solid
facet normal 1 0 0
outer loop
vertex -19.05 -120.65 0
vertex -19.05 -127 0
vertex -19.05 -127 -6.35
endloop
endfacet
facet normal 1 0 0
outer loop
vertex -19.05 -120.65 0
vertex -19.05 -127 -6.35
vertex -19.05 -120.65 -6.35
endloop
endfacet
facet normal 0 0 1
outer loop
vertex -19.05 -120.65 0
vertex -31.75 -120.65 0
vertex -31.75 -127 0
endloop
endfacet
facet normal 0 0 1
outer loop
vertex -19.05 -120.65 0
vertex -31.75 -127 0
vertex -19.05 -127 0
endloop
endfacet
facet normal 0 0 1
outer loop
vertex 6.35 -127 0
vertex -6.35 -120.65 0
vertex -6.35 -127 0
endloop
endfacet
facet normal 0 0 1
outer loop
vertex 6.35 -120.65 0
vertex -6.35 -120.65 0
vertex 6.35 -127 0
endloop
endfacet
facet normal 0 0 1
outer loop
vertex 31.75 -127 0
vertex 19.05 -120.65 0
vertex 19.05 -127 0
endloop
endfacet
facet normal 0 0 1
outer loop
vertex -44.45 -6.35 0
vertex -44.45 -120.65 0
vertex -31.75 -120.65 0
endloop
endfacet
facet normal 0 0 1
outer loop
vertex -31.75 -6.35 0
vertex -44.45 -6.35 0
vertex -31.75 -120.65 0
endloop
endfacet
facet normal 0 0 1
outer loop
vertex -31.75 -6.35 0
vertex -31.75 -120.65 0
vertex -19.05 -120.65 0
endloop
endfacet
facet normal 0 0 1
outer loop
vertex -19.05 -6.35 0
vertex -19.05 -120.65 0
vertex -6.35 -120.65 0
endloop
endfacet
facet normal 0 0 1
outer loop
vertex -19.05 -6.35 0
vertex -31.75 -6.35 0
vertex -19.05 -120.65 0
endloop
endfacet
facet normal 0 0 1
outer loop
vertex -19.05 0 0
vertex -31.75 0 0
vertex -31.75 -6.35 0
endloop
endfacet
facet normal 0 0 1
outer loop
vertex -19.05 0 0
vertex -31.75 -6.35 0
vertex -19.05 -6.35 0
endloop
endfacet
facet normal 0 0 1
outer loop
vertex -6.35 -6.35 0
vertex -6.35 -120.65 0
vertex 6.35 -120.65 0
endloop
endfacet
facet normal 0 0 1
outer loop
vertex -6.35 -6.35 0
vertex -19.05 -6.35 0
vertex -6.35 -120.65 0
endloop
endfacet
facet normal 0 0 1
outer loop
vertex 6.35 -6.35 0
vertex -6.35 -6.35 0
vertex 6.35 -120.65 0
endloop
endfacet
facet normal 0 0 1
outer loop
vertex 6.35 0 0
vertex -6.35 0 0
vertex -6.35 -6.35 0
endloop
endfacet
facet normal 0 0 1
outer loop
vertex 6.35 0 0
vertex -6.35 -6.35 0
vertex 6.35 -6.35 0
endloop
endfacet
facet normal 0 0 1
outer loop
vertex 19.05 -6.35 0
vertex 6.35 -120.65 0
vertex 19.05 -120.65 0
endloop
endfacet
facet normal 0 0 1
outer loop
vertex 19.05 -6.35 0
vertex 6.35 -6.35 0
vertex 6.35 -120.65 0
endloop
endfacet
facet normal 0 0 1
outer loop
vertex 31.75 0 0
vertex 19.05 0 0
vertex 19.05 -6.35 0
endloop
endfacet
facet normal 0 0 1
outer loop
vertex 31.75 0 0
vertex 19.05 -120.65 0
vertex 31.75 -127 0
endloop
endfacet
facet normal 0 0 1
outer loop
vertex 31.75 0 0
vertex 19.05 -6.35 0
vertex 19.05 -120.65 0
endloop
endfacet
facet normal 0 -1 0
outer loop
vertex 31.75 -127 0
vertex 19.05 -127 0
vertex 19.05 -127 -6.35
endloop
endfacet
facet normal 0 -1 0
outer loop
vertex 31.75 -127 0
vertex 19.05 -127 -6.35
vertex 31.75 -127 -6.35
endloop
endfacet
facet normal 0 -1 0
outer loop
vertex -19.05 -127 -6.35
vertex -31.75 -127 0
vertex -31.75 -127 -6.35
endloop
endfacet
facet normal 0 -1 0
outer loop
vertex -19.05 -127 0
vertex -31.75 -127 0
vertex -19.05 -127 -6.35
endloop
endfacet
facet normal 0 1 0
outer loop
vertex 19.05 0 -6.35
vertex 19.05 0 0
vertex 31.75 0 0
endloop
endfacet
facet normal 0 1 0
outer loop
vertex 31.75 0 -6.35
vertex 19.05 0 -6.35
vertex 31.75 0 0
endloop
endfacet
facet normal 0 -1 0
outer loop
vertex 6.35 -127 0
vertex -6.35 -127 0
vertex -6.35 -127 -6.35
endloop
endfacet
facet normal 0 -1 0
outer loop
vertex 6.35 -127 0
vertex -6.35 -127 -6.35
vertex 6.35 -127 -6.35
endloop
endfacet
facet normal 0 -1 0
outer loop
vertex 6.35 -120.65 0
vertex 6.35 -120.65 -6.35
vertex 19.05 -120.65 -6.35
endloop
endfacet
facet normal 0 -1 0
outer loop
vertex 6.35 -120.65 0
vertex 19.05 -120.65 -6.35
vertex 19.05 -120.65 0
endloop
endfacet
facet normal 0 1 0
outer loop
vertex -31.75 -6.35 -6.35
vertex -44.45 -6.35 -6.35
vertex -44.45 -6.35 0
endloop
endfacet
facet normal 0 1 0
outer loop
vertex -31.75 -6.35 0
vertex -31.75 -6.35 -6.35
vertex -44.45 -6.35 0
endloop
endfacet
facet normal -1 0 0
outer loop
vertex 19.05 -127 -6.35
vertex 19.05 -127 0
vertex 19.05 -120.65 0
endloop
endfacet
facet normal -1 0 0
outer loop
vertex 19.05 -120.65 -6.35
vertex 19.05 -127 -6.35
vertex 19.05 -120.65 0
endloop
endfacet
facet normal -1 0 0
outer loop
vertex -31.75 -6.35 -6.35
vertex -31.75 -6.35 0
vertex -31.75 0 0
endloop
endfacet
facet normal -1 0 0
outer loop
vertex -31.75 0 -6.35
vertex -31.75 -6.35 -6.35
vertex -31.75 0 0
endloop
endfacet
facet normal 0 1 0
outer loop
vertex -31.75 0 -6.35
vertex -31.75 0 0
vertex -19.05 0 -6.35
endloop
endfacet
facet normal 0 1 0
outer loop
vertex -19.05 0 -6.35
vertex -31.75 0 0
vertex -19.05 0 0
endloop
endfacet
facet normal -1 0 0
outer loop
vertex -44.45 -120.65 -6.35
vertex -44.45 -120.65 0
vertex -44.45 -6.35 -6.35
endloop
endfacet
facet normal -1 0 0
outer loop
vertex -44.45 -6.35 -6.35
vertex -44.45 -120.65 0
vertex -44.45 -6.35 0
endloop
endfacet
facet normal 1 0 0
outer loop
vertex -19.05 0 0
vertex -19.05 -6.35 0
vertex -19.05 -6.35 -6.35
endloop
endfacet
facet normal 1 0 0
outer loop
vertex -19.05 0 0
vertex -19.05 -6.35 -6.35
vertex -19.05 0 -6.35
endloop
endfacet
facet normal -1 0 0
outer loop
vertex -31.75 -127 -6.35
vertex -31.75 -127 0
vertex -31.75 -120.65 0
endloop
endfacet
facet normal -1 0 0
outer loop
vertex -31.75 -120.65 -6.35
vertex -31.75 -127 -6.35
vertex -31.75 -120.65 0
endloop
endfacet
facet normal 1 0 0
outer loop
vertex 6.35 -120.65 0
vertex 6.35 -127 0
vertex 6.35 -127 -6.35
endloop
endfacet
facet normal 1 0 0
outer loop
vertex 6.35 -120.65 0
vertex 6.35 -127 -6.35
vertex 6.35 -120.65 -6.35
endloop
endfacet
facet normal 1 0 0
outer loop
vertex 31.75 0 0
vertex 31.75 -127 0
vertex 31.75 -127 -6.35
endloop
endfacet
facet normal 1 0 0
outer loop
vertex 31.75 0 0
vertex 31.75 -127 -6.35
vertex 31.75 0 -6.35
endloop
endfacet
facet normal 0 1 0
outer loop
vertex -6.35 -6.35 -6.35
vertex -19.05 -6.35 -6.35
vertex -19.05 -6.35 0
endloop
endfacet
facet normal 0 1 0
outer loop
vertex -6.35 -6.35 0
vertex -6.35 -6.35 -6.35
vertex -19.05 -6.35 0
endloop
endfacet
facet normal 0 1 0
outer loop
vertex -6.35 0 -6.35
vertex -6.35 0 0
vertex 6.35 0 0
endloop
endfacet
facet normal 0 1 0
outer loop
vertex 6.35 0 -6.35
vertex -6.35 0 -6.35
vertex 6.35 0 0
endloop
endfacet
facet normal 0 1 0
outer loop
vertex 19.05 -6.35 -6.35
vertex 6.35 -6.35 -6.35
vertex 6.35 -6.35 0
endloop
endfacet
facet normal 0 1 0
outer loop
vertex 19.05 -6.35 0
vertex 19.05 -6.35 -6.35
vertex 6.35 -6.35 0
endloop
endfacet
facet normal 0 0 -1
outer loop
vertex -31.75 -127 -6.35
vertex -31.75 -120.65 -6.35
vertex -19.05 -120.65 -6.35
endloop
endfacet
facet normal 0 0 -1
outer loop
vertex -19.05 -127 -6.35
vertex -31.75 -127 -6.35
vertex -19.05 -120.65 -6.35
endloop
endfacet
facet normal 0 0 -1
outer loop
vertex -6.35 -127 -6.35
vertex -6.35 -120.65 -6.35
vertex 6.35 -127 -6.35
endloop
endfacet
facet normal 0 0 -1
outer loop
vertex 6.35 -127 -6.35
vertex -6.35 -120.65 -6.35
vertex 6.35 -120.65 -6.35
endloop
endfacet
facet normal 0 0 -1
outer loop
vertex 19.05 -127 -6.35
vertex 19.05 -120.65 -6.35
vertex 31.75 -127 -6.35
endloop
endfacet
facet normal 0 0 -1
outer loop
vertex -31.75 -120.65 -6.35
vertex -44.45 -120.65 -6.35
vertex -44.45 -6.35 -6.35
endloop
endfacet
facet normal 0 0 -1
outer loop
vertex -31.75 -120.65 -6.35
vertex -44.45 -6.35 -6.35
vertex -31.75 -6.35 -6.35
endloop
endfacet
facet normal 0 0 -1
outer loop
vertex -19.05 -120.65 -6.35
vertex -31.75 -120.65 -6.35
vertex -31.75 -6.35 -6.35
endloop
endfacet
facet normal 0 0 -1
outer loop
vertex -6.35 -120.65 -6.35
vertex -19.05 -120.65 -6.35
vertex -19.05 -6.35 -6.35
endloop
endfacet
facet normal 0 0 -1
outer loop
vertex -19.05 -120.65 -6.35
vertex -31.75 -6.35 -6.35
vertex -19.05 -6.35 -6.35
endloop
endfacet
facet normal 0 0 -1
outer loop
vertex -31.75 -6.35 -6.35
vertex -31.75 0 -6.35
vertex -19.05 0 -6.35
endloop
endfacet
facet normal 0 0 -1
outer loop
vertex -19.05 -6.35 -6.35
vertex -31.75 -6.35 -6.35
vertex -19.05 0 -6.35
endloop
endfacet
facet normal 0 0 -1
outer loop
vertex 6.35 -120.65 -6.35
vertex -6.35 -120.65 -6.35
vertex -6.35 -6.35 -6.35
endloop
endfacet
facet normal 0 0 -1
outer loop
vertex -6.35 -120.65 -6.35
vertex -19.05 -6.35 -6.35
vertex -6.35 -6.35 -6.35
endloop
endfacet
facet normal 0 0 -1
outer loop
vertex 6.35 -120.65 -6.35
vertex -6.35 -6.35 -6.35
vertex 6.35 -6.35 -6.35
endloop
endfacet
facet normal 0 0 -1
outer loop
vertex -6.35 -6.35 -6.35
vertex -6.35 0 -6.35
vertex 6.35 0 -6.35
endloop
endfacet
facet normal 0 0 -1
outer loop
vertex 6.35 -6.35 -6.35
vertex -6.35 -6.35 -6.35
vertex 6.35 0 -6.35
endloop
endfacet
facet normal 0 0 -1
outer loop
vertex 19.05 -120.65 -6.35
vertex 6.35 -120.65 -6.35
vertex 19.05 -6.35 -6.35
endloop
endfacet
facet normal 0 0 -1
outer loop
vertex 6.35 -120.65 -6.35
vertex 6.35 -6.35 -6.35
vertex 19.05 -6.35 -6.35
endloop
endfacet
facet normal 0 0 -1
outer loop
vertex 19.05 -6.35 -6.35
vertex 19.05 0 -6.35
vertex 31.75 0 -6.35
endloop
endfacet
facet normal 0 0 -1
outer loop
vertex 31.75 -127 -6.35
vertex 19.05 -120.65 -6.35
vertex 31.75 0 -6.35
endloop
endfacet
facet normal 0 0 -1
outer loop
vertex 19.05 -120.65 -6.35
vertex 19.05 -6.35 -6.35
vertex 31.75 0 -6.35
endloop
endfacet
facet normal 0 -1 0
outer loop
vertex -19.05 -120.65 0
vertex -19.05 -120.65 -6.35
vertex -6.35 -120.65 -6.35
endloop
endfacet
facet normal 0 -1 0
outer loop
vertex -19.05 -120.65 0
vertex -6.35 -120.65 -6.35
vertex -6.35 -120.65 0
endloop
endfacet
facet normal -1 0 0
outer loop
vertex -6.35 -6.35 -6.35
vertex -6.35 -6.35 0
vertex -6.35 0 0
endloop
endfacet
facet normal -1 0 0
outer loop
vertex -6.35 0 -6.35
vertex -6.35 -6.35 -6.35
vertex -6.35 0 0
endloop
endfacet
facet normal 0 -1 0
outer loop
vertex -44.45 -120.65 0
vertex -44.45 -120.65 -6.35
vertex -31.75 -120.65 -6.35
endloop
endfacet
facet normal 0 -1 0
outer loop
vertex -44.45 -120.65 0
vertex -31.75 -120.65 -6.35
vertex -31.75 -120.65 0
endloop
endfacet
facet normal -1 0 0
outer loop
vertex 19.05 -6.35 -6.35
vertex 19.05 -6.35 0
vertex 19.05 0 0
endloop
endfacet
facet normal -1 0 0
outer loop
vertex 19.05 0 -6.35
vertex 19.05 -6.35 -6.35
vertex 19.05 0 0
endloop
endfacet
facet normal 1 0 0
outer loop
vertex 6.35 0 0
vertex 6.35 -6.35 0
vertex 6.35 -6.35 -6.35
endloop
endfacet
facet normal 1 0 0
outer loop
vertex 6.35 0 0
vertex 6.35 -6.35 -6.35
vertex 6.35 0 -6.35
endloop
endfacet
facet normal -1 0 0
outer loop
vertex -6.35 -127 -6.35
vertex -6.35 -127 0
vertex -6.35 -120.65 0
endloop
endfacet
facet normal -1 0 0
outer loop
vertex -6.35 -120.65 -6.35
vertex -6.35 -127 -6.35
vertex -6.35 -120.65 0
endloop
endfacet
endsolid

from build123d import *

# Parameters (mm, degrees)
SKETCH1_W           = 76.2
SKETCH1_H           = 127
BOSS_EXTRUDE1_DEPTH = 6.35
CAVITY1_START       = -44.45
CAVITY1_OUTLINE_W   = 6.35
CAVITY1_OUTLINE_H   = 6.35
CAVITY1_DEPTH       = 12.7
CAVITY1_START_2     = -19.05
CAVITY1_2_OUTLINE_W = 6.35
CAVITY1_2_OUTLINE_H = 6.35
CAVITY1_2_DEPTH     = 12.7
CAVITY1_START_3     = 6.35
CAVITY1_3_OUTLINE_W = 6.35
CAVITY1_3_OUTLINE_H = 6.35
CAVITY1_3_DEPTH     = 12.7


# Read off the part's stored shape, not the designer's step: Cavity1
with BuildPart() as part:
    # Sketch1 → Boss-Extrude1 (new body)
    with BuildSketch(Plane.XY):
        with Locations((-6.35, -63.5)):
            Rectangle(SKETCH1_W, SKETCH1_H)
    extrude(amount=-BOSS_EXTRUDE1_DEPTH)

    # Cavity1 outline → Cavity1 (cut)
    with BuildSketch(Plane.YZ.offset(CAVITY1_START)):
        with Locations((-123.825, -3.175)):
            Rectangle(CAVITY1_OUTLINE_W, CAVITY1_OUTLINE_H)
        with Locations((-3.175, -3.175)):
            Rectangle(CAVITY1_OUTLINE_W, CAVITY1_OUTLINE_H)
    extrude(amount=CAVITY1_DEPTH, mode=Mode.SUBTRACT)

    # Cavity1 2 outline → Cavity1 2 (cut)
    with BuildSketch(Plane.YZ.offset(CAVITY1_START_2)):
        with Locations((-123.825, -3.175)):
            Rectangle(CAVITY1_2_OUTLINE_W, CAVITY1_2_OUTLINE_H)
        with Locations((-3.175, -3.175)):
            Rectangle(CAVITY1_2_OUTLINE_W, CAVITY1_2_OUTLINE_H)
    extrude(amount=CAVITY1_2_DEPTH, mode=Mode.SUBTRACT)

    # Cavity1 3 outline → Cavity1 3 (cut)
    with BuildSketch(Plane.YZ.offset(CAVITY1_START_3)):
        with Locations((-123.825, -3.175)):
            Rectangle(CAVITY1_3_OUTLINE_W, CAVITY1_3_OUTLINE_H)
        with Locations((-3.175, -3.175)):
            Rectangle(CAVITY1_3_OUTLINE_W, CAVITY1_3_OUTLINE_H)
    extrude(amount=CAVITY1_3_DEPTH, mode=Mode.SUBTRACT)


solid = part.part
